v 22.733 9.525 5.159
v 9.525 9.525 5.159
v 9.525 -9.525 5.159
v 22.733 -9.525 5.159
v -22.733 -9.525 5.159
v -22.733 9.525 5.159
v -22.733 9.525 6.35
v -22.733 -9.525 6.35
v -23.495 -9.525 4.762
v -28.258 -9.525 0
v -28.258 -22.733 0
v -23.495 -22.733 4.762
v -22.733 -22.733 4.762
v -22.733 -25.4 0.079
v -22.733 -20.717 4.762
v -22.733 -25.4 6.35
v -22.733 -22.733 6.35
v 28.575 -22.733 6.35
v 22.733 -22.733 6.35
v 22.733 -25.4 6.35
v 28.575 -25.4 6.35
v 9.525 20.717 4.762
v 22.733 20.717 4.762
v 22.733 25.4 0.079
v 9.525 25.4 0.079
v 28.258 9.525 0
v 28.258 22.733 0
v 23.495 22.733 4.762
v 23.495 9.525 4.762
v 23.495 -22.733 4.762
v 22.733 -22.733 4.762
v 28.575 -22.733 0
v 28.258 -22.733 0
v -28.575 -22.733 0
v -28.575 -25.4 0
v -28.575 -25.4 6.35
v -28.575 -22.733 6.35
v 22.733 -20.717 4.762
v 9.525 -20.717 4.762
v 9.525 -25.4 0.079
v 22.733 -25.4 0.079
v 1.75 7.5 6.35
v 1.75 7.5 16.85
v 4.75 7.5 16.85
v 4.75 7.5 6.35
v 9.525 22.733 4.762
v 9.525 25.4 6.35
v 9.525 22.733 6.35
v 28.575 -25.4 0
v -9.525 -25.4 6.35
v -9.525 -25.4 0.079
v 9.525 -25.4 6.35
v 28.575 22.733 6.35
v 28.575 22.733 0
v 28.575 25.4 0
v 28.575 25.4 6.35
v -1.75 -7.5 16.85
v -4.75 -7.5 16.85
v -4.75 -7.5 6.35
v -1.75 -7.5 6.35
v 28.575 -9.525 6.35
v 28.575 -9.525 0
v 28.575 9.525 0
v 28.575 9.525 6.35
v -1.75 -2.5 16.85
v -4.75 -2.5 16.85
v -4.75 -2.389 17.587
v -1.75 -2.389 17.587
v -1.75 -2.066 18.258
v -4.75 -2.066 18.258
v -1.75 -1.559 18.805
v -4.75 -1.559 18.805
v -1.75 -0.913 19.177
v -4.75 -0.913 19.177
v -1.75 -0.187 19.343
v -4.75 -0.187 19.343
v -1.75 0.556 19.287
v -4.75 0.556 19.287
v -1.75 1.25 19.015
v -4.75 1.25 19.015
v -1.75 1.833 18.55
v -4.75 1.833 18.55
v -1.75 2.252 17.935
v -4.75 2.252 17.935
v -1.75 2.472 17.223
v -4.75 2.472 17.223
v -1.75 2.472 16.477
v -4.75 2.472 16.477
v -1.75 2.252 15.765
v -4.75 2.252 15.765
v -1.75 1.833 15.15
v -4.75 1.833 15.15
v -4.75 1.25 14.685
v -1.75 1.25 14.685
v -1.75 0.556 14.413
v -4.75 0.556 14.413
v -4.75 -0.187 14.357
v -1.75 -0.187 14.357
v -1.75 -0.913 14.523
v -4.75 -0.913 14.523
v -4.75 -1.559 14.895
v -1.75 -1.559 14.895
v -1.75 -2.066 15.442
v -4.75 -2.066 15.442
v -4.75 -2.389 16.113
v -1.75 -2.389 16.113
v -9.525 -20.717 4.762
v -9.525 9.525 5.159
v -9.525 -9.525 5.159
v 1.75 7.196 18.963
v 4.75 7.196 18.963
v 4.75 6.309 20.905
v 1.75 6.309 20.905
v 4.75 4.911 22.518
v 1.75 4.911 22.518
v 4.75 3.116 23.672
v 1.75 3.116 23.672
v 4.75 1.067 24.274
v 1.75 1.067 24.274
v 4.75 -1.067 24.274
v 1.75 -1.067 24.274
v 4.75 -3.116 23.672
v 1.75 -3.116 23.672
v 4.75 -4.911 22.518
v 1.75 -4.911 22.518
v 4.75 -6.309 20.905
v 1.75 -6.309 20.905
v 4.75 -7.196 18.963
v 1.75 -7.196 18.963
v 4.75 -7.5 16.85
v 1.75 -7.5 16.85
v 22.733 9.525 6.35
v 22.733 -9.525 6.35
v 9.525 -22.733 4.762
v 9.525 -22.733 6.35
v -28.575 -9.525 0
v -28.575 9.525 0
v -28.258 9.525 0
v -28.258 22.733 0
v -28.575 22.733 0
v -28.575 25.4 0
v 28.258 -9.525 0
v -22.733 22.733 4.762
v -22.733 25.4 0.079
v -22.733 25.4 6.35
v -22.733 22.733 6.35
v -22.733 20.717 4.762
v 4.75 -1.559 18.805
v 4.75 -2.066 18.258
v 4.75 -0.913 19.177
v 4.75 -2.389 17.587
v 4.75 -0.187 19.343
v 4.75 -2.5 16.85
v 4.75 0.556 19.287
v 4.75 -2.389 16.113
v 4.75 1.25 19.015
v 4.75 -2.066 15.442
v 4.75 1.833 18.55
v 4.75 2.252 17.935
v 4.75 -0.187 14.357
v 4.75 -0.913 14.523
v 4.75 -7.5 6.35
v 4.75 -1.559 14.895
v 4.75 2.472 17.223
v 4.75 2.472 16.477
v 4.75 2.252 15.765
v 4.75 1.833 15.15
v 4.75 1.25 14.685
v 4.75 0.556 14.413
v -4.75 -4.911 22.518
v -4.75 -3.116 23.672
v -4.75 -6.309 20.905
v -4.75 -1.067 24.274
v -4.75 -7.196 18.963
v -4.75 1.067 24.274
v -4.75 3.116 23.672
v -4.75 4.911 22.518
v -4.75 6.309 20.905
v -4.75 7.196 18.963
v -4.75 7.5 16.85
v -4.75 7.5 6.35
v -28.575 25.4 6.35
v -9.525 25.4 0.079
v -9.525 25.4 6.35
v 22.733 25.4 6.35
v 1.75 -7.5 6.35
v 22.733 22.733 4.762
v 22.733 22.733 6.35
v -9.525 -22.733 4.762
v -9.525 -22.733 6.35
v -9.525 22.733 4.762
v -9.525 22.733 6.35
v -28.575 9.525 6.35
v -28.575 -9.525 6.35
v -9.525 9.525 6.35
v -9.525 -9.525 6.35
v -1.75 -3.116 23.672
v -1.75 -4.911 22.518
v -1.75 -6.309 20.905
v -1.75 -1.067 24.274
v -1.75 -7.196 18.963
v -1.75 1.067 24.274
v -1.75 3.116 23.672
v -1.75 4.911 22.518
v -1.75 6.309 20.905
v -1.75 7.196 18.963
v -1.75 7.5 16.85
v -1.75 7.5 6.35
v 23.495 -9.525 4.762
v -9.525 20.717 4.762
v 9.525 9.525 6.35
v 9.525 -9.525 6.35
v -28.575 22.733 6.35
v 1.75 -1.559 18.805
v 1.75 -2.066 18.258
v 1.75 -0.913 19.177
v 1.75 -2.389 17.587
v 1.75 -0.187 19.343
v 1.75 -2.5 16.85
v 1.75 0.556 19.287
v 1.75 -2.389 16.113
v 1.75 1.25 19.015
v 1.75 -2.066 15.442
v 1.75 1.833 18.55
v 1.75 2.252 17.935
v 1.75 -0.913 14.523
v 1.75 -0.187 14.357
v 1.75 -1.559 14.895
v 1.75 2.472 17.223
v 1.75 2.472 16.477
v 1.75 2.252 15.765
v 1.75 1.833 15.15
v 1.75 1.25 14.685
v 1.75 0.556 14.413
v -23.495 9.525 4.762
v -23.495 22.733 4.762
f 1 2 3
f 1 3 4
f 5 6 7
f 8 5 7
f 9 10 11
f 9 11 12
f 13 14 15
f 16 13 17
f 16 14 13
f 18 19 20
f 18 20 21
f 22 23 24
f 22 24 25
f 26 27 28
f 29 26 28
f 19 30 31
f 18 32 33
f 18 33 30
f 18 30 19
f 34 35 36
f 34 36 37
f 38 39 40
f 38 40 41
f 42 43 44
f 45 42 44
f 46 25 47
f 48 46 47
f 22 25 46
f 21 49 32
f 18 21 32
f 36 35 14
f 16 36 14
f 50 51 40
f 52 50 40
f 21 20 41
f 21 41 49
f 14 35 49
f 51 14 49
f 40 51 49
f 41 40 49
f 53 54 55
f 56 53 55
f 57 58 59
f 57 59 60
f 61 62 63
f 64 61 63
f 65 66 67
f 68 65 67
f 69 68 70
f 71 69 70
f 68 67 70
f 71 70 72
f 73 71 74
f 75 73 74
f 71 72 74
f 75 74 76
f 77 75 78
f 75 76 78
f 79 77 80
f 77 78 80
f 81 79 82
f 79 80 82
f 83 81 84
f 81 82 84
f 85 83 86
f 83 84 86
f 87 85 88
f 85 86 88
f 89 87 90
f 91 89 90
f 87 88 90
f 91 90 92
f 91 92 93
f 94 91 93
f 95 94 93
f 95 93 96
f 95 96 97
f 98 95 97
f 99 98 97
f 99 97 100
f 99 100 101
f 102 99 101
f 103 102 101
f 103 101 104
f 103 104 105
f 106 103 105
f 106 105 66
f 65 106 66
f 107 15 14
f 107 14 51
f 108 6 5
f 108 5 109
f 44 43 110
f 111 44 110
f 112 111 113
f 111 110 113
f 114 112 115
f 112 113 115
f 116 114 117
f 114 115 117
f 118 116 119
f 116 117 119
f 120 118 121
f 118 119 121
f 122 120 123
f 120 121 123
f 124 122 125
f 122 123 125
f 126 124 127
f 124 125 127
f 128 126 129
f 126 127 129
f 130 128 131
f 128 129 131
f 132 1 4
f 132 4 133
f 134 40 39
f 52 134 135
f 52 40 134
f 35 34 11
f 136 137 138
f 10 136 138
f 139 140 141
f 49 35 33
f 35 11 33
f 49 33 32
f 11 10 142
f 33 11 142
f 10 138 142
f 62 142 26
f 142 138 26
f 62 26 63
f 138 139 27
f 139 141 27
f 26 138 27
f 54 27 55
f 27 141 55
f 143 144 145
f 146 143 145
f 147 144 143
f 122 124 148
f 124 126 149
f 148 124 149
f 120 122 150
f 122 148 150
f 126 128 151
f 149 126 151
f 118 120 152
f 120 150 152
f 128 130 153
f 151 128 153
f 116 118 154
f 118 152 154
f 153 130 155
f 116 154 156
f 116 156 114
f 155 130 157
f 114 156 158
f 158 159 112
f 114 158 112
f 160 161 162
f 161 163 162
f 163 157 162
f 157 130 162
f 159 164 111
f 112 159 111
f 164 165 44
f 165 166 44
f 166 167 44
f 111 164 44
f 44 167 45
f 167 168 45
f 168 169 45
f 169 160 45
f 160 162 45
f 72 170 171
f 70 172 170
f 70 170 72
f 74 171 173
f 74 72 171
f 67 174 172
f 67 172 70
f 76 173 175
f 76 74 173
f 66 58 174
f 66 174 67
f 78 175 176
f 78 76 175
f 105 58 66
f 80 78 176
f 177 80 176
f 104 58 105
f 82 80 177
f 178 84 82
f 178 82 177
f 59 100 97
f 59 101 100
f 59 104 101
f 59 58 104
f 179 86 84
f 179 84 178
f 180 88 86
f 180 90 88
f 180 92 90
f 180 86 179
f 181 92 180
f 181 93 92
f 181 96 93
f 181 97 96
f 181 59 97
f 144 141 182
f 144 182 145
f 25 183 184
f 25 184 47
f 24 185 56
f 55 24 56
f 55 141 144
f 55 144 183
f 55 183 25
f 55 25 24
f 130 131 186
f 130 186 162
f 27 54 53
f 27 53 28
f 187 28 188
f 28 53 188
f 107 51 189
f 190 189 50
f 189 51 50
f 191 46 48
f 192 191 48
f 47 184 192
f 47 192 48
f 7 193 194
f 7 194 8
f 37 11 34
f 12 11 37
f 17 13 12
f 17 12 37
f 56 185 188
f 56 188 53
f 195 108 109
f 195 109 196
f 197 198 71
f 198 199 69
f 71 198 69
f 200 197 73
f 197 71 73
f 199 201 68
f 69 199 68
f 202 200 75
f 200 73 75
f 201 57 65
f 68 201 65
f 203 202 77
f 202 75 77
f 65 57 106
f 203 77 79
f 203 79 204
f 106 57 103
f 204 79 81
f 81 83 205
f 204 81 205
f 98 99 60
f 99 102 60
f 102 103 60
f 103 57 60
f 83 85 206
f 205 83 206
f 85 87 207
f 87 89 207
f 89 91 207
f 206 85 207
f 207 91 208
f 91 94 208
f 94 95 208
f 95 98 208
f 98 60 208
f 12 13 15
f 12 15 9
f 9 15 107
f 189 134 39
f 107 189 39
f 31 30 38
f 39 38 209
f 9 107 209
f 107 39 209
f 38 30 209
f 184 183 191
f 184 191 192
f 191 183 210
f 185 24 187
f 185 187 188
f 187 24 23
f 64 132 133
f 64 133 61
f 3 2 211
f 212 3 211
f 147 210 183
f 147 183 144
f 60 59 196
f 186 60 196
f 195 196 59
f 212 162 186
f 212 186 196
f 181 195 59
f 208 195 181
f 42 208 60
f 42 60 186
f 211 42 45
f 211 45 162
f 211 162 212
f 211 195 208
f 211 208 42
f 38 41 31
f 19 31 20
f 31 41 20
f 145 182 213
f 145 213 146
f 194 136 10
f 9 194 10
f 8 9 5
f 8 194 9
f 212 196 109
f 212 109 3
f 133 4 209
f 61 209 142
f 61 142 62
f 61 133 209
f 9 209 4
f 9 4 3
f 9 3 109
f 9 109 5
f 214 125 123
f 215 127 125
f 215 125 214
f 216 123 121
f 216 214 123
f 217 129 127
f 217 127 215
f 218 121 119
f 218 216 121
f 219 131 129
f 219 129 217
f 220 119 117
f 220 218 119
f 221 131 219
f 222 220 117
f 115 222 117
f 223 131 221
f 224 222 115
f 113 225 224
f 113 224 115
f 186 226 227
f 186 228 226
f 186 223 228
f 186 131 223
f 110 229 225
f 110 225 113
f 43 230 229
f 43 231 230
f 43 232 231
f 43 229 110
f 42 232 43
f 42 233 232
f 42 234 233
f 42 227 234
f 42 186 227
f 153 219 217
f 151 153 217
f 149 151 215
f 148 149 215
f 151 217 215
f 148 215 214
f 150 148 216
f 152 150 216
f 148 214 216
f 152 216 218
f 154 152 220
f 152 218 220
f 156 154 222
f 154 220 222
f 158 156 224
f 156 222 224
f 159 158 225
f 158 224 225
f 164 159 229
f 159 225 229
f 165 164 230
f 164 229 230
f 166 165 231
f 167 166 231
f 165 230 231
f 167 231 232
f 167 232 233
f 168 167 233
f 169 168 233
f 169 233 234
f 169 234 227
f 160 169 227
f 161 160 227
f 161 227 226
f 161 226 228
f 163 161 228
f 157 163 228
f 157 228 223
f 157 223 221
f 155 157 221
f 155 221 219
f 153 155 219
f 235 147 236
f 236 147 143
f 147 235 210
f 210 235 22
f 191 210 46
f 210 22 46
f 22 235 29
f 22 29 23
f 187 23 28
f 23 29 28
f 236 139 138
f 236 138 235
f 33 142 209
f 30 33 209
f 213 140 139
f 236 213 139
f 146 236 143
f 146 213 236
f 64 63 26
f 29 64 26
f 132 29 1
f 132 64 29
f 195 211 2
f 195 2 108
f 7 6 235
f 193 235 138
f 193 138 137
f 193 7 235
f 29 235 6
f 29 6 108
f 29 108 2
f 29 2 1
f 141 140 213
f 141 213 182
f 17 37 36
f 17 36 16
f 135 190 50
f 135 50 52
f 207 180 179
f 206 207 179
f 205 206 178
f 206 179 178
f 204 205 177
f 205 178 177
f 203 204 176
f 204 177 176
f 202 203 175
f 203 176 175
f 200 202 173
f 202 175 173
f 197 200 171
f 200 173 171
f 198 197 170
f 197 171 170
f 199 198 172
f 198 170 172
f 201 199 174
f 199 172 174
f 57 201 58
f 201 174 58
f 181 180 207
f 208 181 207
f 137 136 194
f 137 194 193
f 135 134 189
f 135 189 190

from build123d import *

# Parameters (mm, degrees)
F0_W         = 57.15
F0_H         = 50.8
F1_DEPTH     = 6.35
F2_W         = 13.208
F2_H         = 1.190625
F3_DEPTH     = 50.801
F4_SIZE      = 5.08
F5_W         = 3
F5_H         = 15
F6_DEPTH     = 18
F8_D         = 5
F9_W         = 13.208
F9_H         = 1.5875
F10_DEPTH    = 57.151
F11_T1_DEPTH = 13.208
F11_T3_DEPTH = 13.208
F13_DEPTH    = 33.326


# Not quite as in the source:
# - a fillet or chamfer that OpenCascade refuses, or shapes differently, is made with other operations: its cross-section is extruded or revolved along the edge and cut away or added


with BuildPart() as f1:
    # F0 (on Top) → F1 (new body)
    with BuildSketch(Plane.XY):
        Rectangle(F0_W, F0_H)
    extrude(amount=F1_DEPTH)

    # F2 (on face) → F3 (cut, through all)
    with BuildSketch(Plane.XZ.offset(25.4)):
        with Locations((-16.129, 5.7546875)):
            Rectangle(F2_W, F2_H)
        with Locations((16.129, 5.7546875)):
            Rectangle(F2_W, F2_H)
    extrude(amount=-F3_DEPTH, mode=Mode.SUBTRACT)

    # F4
    f4_edges = [f1.edges().sort_by_distance(p)[0] for p in [
        (-16.129, -25.4, 5.159375),
        (16.129, -25.4, 5.159375),
        (-16.129, 25.4, 5.159375),
        (16.129, 25.4, 5.159375),
    ]]
    chamfer(f4_edges, length=F4_SIZE)

    # F5 (on face) → F6 (join)
    with BuildSketch(Plane.XY.offset(6.35)):
        with Locations((-3.25, 0)):
            Rectangle(F5_W, F5_H)
        with Locations((3.25, 0)):
            Rectangle(F5_W, F5_H)
    extrude(amount=F6_DEPTH)

    # F8 (through all)
    with Locations(Plane.YZ.offset(4.75)):
        with Locations((0, 16.85)):
            Hole(F8_D / 2)

    # F9 (on face) → F10 (cut, through all)
    with BuildSketch(Plane.YZ.offset(28.575)):
        with Locations((-16.129, 5.55625)):
            Rectangle(F9_W, F9_H)
        with Locations((16.129, 5.55625)):
            Rectangle(F9_W, F9_H)
    extrude(amount=-F10_DEPTH, mode=Mode.SUBTRACT)

    # F11: chamfer of 5.08 on 4 edges, made by hand

    # F11_s2 → F11_t1 (cut)
    with BuildSketch(Plane.XZ.offset(-22.733)):
        Polygon((28.575, -0.3175), (23.495, 4.7625), (28.575, 4.7625), align=None)
        Polygon((-28.575, -0.3175), (-23.495, 4.7625), (-28.575, 4.7625), align=None)
    extrude(amount=F11_T1_DEPTH, mode=Mode.SUBTRACT)

    # F11_s4 → F11_t3 (cut)
    with BuildSketch(Plane.XZ.offset(9.525)):
        Polygon((28.575, -0.3175), (23.495, 4.7625), (28.575, 4.7625), align=None)
        Polygon((-28.575, -0.3175), (-23.495, 4.7625), (-28.575, 4.7625), align=None)
    extrude(amount=F11_T3_DEPTH, mode=Mode.SUBTRACT)

    # F12 (on face) → F13 (cut, through all)
    with BuildSketch(Plane(origin=(-4.75, 0, 0), x_dir=(0, -1, 0), z_dir=(-1, 0, 0))):
        with BuildLine():
            Line((-7.5, 24.35), (-7.5, 16.85))
            ThreePointArc((-7.5, 16.85), (-5.3033008589, 22.1533008589), (0, 24.35))
            Line((0, 24.35), (-7.5, 24.35))
        make_face()
        with BuildLine():
            Line((7.5, 24.35), (0, 24.35))
            ThreePointArc((0, 24.35), (5.3033008589, 22.1533008589), (7.5, 16.85))
            Line((7.5, 16.85), (7.5, 24.35))
        make_face()
    extrude(amount=-F13_DEPTH, mode=Mode.SUBTRACT)


solid = f1.part
